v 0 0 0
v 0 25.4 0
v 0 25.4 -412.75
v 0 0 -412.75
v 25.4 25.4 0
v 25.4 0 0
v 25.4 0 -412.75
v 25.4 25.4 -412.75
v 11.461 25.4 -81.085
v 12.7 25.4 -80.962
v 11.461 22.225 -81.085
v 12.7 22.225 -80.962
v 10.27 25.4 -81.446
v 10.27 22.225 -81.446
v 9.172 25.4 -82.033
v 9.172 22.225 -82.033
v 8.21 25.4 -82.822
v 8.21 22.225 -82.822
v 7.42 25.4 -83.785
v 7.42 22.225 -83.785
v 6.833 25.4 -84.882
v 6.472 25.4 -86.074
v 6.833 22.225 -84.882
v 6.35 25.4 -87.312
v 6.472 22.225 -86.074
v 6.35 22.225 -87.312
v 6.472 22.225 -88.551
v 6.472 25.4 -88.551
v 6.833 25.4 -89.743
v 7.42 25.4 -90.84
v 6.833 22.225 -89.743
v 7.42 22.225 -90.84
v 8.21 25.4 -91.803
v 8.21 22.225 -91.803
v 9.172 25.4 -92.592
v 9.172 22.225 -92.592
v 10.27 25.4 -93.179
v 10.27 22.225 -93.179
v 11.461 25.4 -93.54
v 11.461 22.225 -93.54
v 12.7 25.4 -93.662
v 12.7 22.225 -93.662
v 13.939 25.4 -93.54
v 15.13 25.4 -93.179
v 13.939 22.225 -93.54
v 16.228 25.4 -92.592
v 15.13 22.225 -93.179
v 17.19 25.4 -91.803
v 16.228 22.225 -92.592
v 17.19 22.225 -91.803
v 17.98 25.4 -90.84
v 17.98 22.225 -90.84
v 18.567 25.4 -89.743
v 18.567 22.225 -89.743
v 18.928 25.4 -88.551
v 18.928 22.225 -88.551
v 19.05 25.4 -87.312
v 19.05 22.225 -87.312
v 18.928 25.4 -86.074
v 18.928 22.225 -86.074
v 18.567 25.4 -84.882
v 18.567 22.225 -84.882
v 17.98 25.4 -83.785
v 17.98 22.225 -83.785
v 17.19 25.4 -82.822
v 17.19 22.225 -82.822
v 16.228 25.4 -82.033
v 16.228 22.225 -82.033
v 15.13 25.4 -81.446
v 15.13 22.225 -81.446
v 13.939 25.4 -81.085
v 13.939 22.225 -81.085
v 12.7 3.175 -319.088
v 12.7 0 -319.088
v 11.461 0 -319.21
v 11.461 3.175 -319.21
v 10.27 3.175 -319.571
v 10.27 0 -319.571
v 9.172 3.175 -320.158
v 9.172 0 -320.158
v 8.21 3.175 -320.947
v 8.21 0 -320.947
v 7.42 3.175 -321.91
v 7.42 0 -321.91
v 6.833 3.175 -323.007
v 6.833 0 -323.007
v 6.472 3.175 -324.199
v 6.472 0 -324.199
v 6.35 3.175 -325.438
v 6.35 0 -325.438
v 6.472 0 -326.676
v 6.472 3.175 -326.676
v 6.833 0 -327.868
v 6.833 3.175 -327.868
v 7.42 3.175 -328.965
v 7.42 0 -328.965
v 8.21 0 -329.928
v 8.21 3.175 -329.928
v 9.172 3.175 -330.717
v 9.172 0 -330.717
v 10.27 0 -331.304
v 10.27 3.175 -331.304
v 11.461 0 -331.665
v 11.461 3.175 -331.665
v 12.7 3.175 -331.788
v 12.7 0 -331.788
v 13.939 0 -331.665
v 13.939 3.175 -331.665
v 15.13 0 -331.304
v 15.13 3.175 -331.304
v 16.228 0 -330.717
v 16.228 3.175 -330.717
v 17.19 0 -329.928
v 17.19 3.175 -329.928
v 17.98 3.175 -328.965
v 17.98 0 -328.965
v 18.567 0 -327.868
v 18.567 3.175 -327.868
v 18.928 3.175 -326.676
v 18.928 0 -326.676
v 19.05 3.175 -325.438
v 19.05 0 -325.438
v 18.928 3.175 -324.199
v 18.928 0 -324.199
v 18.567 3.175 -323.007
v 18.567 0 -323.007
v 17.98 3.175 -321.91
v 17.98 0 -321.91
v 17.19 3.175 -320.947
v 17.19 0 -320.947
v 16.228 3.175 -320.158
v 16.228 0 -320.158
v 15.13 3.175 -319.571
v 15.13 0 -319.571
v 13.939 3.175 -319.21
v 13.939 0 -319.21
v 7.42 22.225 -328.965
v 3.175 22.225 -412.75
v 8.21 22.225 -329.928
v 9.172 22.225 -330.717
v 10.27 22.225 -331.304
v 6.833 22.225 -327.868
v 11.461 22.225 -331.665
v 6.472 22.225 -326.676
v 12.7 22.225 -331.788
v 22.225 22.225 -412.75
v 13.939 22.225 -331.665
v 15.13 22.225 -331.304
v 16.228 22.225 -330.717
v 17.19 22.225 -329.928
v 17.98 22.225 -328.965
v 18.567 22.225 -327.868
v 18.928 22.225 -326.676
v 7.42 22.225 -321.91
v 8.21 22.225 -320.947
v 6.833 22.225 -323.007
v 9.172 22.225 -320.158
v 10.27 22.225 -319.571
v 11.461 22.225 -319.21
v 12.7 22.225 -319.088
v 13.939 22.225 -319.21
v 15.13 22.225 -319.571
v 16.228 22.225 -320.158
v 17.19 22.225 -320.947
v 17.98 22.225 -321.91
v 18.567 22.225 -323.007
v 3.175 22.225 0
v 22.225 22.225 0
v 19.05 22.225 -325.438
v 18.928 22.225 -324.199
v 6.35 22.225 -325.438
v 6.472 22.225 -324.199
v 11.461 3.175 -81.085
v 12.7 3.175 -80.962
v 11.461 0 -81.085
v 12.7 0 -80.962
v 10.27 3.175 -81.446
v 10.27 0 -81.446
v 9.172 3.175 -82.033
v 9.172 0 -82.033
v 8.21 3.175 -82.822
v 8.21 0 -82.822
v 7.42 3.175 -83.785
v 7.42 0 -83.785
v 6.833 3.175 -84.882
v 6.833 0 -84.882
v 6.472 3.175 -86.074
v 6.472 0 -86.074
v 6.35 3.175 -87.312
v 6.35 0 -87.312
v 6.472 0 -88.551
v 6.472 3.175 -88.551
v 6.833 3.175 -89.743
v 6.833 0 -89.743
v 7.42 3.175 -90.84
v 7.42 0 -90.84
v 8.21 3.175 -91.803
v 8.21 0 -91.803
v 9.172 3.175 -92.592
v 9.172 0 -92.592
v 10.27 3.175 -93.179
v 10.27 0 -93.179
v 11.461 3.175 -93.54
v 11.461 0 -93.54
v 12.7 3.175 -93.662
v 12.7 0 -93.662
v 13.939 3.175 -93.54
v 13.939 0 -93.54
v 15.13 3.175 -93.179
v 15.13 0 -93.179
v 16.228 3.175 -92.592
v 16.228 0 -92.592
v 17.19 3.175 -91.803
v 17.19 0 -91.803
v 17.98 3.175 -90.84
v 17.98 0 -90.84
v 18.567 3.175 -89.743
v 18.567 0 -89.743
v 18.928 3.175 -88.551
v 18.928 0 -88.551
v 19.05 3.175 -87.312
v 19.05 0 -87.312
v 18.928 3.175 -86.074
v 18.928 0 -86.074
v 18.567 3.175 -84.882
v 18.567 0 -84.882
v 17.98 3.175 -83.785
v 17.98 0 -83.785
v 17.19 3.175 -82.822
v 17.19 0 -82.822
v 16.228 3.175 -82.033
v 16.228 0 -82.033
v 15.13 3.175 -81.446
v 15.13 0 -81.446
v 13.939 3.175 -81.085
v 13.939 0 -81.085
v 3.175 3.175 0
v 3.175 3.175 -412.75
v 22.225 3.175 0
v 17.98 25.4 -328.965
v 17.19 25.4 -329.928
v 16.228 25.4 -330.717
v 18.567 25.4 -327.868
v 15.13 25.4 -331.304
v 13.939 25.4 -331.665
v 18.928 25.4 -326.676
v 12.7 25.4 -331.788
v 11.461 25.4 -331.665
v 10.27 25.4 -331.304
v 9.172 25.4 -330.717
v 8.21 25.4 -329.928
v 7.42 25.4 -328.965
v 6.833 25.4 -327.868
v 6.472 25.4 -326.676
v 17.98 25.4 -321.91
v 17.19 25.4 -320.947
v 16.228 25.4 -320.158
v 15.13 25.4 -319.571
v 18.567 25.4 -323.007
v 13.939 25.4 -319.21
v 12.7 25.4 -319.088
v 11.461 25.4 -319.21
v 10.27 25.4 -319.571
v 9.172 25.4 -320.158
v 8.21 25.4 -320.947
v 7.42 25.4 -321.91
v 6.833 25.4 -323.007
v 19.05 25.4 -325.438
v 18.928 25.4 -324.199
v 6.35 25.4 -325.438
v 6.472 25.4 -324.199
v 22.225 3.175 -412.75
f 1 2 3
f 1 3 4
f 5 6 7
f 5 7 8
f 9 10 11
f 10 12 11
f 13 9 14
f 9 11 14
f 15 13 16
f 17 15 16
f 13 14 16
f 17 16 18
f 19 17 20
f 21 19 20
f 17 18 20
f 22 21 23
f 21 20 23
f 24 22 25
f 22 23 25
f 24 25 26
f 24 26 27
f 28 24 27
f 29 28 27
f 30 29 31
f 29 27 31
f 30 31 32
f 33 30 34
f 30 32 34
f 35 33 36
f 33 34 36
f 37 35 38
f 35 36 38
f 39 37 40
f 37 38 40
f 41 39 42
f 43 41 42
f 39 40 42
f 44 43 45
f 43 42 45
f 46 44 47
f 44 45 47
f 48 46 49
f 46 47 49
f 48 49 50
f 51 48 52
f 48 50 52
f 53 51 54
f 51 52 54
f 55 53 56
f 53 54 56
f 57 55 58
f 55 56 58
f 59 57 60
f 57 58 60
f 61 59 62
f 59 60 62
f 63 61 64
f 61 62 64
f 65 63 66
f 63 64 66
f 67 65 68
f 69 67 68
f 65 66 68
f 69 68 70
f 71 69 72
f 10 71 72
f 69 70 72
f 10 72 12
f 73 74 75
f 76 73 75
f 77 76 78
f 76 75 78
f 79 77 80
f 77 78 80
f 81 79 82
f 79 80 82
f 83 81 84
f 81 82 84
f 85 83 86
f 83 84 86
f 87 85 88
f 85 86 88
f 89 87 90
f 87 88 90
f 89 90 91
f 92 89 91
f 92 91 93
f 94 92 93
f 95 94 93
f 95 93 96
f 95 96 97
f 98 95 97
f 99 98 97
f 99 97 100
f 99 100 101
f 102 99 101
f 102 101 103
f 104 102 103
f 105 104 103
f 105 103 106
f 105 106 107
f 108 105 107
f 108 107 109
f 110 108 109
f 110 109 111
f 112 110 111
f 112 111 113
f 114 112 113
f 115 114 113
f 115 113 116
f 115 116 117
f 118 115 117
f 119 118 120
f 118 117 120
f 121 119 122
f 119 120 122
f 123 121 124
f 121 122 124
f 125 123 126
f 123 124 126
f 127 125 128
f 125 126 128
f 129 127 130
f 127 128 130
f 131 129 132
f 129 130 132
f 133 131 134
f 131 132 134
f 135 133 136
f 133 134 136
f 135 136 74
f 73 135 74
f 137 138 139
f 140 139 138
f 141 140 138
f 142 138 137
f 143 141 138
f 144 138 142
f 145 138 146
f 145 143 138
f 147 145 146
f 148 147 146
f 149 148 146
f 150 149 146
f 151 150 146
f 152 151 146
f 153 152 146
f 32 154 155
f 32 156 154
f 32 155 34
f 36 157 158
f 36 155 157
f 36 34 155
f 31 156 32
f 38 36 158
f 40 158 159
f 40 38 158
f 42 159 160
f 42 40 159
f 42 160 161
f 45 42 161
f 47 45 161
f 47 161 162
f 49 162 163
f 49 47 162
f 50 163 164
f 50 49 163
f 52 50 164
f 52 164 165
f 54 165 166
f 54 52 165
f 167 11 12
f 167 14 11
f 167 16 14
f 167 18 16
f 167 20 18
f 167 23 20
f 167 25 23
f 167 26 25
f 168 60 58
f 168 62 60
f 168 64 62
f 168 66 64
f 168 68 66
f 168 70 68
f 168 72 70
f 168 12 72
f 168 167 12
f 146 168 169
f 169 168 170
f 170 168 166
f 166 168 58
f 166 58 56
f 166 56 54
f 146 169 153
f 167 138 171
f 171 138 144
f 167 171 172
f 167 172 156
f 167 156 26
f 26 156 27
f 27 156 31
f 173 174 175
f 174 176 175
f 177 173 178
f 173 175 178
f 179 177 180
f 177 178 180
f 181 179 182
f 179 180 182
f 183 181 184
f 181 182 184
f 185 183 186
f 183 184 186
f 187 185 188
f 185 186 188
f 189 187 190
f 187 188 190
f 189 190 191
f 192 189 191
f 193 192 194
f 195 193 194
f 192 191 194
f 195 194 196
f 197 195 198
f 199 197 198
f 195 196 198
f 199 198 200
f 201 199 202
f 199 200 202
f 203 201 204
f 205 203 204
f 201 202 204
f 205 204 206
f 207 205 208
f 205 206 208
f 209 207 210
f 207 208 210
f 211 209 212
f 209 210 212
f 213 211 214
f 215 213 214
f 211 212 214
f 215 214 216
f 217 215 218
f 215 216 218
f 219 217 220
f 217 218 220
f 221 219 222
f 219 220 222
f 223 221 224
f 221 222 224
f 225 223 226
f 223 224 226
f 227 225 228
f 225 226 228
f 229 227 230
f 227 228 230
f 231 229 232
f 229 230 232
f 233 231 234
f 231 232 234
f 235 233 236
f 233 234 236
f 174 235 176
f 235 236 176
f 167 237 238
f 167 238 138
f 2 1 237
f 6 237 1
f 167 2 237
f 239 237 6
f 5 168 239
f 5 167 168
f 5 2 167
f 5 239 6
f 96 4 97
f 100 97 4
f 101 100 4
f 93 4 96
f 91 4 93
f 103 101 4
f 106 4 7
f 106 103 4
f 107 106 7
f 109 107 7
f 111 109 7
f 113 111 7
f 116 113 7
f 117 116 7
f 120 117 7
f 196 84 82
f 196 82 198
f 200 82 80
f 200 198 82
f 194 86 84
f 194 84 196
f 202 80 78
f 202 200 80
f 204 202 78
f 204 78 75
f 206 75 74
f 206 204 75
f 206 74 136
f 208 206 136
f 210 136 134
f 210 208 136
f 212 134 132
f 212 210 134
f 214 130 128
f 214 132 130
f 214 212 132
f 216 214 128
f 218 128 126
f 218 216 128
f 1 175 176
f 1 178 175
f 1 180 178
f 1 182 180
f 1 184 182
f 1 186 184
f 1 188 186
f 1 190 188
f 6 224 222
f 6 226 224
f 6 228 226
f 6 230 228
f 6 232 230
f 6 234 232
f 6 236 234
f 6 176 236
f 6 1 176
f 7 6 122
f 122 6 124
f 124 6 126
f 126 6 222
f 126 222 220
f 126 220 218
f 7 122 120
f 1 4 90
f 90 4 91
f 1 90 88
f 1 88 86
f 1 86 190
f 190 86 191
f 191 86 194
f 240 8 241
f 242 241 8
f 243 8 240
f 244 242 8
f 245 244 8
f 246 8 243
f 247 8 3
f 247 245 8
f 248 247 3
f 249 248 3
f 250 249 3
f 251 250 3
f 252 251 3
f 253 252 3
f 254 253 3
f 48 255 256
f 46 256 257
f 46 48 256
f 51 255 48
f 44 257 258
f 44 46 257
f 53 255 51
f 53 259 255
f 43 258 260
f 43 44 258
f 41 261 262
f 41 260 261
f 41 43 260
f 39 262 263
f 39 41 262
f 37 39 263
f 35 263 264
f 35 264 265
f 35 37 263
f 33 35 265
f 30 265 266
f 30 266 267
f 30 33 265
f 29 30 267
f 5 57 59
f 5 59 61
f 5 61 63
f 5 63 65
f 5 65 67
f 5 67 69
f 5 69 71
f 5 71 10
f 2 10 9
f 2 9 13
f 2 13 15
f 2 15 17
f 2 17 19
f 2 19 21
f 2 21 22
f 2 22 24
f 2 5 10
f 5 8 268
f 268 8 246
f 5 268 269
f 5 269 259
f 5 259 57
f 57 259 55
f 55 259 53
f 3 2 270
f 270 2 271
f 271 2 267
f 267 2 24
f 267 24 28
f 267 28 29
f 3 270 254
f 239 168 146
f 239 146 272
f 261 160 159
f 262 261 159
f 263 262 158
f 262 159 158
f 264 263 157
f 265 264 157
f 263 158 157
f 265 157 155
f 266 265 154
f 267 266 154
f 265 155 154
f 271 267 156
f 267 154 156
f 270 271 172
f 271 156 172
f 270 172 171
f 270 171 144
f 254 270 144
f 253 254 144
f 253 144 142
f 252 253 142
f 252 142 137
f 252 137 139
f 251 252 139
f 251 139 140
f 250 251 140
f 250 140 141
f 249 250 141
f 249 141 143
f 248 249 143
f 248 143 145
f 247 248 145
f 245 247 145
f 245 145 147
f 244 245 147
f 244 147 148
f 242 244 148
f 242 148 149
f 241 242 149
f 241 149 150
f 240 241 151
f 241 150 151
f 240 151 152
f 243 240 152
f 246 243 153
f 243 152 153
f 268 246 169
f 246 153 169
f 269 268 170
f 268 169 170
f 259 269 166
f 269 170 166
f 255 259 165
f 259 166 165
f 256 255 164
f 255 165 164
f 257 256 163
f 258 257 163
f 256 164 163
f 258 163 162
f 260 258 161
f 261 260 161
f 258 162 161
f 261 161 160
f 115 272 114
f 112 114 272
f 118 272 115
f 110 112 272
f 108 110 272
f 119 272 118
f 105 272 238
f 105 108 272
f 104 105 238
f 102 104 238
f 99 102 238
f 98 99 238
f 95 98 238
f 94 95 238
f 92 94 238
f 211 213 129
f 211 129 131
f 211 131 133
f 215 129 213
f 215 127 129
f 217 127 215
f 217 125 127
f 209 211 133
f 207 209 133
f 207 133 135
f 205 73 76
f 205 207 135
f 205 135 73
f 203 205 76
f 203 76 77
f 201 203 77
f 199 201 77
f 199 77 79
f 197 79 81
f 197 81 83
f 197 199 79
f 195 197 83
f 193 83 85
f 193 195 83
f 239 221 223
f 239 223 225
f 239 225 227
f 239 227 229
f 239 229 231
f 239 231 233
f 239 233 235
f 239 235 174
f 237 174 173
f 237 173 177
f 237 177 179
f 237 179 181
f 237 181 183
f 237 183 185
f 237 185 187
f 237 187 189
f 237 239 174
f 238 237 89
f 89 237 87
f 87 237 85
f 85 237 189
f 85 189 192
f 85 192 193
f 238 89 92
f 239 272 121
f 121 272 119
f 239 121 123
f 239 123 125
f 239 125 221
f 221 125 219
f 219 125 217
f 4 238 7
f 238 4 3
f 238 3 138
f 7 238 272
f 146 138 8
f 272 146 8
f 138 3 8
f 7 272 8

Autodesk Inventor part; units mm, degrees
ref_plane "YZ Plane" through (0, 0, 0) normal (1, 0, 0) x (0, 1, 0)
ref_plane "XZ Plane" through (0, 0, 0) normal (0, 1, 0) x (-1, 0, 0)
ref_plane "XY Plane" through (0, 0, 0) normal (0, 0, 1) x (1, 0, 0)
sketch "Sketch1" plane through (0, 0, 0) normal (0, 0, 1) x (1, 0, 0)
  line L0 (0, 0) -> (25.4, 0)
  line L1 (25.4, 0) -> (25.4, 25.4)
  line L2 (25.4, 25.4) -> (0, 25.4)
  line L3 (0, 25.4) -> (0, 0)
  line L4 (3.175, 22.225) -> (22.225, 22.225)
  line L5 (22.225, 22.225) -> (22.225, 3.175)
  line L6 (22.225, 3.175) -> (3.175, 3.175)
  line L7 (3.175, 3.175) -> (3.175, 22.225)
  dimension "d0" = 25.4
  dimension "d1" = 25.4
  dimension "d2" = 3.175
extrude "Extrusion1" add sketch "Sketch1" against normal blind 412.75
sketch "Sketch2" plane through (0, 25.4, 0) normal (0, 1, 0) x (1, 0, 0)
  line L0 (25.4, 412.75) -> (0, 412.75) projected
  line L1 (25.4, 0) -> (0, 0) projected
  point P0 (12.7, 87.3125)
  point P1 (12.7, 325.4375)
  dimension "d5" = 87.3125
  dimension "d6" = 87.3125
hole "Hole1" at (12.7, 25.4, -87.3125) at (12.7, 25.4, -325.4375) direction (0, -1, 0) diameter 12.7 depth 25.4 tip angle 118
properties part number "16.25inch tube"
